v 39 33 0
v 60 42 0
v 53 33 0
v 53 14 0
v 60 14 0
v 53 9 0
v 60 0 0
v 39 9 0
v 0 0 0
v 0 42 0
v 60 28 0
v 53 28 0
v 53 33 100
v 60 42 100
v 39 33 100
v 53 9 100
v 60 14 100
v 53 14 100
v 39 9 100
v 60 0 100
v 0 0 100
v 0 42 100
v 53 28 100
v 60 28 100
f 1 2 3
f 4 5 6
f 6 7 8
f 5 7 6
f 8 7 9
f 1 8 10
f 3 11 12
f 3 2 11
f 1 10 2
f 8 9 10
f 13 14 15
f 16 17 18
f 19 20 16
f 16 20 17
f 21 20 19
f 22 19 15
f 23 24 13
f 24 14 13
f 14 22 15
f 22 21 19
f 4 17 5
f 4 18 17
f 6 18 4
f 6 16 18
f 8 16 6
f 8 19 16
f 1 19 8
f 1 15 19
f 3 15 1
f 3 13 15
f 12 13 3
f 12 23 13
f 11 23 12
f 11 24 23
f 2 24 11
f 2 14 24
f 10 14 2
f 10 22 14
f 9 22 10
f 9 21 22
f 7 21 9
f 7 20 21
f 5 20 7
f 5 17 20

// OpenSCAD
$fn = 32;

// ----------------------------------------------------------------------
// T-slot rail: 60 x 42 mm section, 100 mm long
// ----------------------------------------------------------------------

// --- parameters (mm) ---
profile_height = 100;     // extrusion height
profile_points = 12;      // points of the closed outline

profile = [[0, 0], [60, 0], [60, 14], [53, 14], [53, 9], [39, 9], [39, 33], [53, 33], [53, 28], [60, 28], [60, 42], [0, 42]];  // single closed polygon, 12 points, counter clockwise

// --- the one profile operation ---
linear_extrude(height = profile_height) polygon(points = profile);
